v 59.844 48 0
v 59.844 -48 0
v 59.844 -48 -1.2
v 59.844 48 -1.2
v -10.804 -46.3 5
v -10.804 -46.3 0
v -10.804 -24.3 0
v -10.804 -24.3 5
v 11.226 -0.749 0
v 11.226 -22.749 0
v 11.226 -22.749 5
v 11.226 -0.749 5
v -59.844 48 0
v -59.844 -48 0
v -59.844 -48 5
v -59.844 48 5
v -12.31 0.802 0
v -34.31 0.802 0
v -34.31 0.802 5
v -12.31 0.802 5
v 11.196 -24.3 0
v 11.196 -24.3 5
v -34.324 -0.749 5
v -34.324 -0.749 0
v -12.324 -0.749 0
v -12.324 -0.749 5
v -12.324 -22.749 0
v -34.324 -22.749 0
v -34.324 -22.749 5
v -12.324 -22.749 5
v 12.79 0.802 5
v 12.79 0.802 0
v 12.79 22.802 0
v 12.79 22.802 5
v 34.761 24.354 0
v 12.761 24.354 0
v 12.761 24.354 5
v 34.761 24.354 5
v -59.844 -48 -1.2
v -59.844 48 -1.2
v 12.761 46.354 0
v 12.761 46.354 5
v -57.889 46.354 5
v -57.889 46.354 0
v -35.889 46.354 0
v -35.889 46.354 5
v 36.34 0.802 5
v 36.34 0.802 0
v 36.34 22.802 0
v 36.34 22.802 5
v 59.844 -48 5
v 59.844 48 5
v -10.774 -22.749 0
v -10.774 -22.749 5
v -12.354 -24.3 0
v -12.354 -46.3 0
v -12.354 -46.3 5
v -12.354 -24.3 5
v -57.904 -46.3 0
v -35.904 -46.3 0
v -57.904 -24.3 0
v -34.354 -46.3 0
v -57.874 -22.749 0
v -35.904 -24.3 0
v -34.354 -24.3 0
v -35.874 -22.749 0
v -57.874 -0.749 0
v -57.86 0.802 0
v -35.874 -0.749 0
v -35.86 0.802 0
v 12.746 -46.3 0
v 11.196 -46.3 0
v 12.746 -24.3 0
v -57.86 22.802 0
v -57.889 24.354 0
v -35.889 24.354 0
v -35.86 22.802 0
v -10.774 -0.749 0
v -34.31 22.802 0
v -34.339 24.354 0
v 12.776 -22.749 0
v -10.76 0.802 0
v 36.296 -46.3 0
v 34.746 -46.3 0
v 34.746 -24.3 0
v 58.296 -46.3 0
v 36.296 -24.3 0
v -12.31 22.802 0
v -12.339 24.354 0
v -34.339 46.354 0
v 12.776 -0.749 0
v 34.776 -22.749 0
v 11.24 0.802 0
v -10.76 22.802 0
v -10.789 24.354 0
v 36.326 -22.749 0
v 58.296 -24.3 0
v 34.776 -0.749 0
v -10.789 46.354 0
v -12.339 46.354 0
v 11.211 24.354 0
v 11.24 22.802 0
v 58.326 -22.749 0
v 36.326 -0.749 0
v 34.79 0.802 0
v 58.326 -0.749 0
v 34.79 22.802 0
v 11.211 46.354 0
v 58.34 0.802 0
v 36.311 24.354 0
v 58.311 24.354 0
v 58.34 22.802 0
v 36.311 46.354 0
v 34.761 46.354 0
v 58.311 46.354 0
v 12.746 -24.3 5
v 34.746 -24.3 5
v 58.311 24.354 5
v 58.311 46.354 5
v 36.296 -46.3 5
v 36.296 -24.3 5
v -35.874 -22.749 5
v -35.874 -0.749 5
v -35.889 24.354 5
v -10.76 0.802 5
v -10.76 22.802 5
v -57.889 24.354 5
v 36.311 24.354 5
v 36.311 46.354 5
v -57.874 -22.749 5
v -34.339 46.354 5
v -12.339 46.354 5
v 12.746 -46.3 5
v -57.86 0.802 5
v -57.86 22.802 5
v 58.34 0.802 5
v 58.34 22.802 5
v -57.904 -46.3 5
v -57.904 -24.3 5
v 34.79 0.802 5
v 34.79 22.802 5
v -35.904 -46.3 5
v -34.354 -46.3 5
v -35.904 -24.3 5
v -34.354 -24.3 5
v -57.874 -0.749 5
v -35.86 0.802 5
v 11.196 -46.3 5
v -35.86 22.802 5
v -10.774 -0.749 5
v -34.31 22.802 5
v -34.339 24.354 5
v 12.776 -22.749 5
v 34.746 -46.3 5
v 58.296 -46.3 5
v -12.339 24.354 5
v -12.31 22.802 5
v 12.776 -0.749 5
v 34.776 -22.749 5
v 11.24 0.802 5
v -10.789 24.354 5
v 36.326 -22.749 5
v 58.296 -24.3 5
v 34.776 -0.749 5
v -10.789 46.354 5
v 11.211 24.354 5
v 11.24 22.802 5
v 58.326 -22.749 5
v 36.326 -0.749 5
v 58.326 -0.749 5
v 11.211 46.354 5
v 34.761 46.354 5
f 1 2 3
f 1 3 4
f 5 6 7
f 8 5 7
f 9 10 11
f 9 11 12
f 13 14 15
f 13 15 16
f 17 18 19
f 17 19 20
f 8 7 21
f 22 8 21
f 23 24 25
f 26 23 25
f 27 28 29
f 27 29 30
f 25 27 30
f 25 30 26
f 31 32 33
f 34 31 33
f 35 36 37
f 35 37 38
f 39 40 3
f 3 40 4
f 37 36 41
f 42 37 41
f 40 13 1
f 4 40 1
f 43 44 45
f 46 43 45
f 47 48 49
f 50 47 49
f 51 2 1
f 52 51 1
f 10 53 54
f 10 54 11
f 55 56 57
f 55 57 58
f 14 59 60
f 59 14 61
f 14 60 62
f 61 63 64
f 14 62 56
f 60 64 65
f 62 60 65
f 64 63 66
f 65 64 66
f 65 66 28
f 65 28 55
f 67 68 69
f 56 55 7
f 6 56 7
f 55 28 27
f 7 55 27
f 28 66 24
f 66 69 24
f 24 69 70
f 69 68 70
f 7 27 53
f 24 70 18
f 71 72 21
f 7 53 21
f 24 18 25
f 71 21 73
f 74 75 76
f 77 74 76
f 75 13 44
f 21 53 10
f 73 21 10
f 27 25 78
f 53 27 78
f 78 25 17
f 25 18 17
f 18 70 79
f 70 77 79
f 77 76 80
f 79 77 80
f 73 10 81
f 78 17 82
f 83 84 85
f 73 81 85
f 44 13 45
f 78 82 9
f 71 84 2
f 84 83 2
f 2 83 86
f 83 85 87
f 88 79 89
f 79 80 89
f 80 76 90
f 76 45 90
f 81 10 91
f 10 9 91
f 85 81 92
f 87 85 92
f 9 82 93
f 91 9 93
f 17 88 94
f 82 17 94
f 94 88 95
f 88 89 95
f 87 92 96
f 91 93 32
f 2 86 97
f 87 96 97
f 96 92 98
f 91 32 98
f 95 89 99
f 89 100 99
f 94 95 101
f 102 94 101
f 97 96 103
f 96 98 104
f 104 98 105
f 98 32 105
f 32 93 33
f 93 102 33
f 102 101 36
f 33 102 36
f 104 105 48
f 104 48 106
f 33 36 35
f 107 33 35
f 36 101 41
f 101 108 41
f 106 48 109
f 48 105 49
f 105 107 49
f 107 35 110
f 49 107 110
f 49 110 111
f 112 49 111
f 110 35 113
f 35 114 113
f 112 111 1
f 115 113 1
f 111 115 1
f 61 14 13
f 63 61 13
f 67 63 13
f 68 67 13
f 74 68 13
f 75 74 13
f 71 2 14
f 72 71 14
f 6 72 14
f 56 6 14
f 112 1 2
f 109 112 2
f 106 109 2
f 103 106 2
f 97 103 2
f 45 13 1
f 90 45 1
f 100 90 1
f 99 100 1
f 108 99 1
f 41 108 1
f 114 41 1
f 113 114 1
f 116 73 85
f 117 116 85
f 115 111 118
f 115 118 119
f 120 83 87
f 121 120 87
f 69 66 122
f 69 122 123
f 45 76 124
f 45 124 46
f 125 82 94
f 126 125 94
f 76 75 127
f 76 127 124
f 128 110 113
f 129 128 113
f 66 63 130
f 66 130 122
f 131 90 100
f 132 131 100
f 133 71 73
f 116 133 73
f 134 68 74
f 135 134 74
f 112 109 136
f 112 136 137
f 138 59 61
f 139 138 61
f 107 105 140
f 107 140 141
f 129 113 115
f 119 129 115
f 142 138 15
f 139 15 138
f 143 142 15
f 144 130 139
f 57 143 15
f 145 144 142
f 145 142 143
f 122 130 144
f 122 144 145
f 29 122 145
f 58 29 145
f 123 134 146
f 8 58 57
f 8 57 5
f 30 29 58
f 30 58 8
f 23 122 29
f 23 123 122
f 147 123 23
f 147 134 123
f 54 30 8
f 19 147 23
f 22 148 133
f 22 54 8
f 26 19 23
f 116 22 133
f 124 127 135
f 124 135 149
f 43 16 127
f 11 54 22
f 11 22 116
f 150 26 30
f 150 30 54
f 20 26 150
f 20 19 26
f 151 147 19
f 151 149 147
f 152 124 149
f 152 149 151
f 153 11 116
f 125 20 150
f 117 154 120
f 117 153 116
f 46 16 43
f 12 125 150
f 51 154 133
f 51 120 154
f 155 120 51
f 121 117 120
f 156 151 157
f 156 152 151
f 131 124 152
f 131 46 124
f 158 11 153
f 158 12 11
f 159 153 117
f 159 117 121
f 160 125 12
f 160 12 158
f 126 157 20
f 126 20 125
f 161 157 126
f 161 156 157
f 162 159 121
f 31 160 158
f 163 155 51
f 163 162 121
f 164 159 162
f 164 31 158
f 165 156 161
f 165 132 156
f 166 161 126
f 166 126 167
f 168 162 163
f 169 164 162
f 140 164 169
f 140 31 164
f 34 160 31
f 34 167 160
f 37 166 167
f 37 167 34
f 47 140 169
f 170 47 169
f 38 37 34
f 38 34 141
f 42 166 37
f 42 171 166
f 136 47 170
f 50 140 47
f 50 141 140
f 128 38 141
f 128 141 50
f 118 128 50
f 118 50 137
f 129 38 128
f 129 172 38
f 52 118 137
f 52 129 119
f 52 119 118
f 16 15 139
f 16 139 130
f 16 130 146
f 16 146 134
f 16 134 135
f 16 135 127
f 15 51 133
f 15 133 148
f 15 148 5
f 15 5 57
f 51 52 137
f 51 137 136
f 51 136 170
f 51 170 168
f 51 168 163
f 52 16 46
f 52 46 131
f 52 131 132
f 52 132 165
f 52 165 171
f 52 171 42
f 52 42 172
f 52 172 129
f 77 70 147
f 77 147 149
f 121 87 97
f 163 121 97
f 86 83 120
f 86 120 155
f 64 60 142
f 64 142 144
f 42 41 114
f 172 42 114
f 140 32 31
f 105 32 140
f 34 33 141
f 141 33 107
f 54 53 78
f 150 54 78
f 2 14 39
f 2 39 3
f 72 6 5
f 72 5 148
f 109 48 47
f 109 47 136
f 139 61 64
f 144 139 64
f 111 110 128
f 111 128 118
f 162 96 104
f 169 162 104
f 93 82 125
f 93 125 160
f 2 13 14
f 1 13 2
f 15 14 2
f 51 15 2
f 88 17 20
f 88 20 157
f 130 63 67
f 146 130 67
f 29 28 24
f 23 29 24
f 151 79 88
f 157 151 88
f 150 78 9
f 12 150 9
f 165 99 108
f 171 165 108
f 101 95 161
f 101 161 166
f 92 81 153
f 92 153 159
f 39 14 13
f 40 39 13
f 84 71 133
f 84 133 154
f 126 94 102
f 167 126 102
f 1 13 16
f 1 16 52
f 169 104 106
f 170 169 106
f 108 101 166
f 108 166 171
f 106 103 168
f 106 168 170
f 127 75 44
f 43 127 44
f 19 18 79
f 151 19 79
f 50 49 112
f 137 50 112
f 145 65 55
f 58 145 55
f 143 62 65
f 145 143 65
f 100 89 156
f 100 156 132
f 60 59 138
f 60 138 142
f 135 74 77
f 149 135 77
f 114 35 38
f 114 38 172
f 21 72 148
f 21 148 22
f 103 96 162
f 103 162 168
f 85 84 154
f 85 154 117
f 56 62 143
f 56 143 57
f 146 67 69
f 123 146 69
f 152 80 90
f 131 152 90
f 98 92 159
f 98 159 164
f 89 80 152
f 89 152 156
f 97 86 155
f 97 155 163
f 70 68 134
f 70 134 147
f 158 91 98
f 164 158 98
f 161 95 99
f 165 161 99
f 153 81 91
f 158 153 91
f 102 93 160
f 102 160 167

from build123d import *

# Parameters (mm, degrees)
F0_W     = 119.688
F0_H     = 96
F0_W_2   = 22
F0_H_2   = 22
F0_W_3   = 21.999999
F1_DEPTH = 1.2
F2_DEPTH = 5


with BuildPart() as f1:
    # F0 (on Top) → F1 (new body)
    with BuildSketch(Plane.XY):
        Rectangle(F0_W, F0_H)
        with Locations((-46.903828, -35.3)):
            Rectangle(F0_W_2, F0_H_2, mode=Mode.SUBTRACT)
        with Locations((-23.353828, -35.3)):
            Rectangle(F0_W_2, F0_H_2, mode=Mode.SUBTRACT)
        with Locations((-46.8744295, -11.748823)):
            Rectangle(F0_W_3, F0_H_2, mode=Mode.SUBTRACT)
        with Locations((-23.32443, -11.748823)):
            Rectangle(F0_W_2, F0_H_2, mode=Mode.SUBTRACT)
        with Locations((0.196172, -35.3)):
            Rectangle(F0_W_2, F0_H_2, mode=Mode.SUBTRACT)
        with Locations((23.746172, -35.3)):
            Rectangle(F0_W_2, F0_H_2, mode=Mode.SUBTRACT)
        with Locations((47.296172, -35.3)):
            Rectangle(F0_W_2, F0_H_2, mode=Mode.SUBTRACT)
        with Locations((0.22557, -11.748823)):
            Rectangle(F0_W_2, F0_H_2, mode=Mode.SUBTRACT)
        with Locations((23.77557, -11.748823)):
            Rectangle(F0_W_2, F0_H_2, mode=Mode.SUBTRACT)
        with Locations((47.32557, -11.748823)):
            Rectangle(F0_W_2, F0_H_2, mode=Mode.SUBTRACT)
        with Locations((-46.859731, 11.802354)):
            Rectangle(F0_W_2, F0_H_2, mode=Mode.SUBTRACT)
        with Locations((-23.309731, 11.802354)):
            Rectangle(F0_W_2, F0_H_2, mode=Mode.SUBTRACT)
        with Locations((-46.889129, 35.35353)):
            Rectangle(F0_W_2, F0_H_2, mode=Mode.SUBTRACT)
        with Locations((-23.339129, 35.35353)):
            Rectangle(F0_W_2, F0_H_2, mode=Mode.SUBTRACT)
        with Locations((0.240269, 11.802354)):
            Rectangle(F0_W_2, F0_H_2, mode=Mode.SUBTRACT)
        with Locations((23.790269, 11.802354)):
            Rectangle(F0_W_2, F0_H_2, mode=Mode.SUBTRACT)
        with Locations((47.340269, 11.802354)):
            Rectangle(F0_W_2, F0_H_2, mode=Mode.SUBTRACT)
        with Locations((0.210871, 35.35353)):
            Rectangle(F0_W_2, F0_H_2, mode=Mode.SUBTRACT)
        with Locations((23.760871, 35.35353)):
            Rectangle(F0_W_2, F0_H_2, mode=Mode.SUBTRACT)
        with Locations((47.310871, 35.35353)):
            Rectangle(F0_W_2, F0_H_2, mode=Mode.SUBTRACT)
        with Locations((47.310871, 35.35353)):
            Rectangle(F0_W_2, F0_H_2)
        with Locations((47.340269, 11.802354)):
            Rectangle(F0_W_2, F0_H_2)
        with Locations((23.746172, -35.3)):
            Rectangle(F0_W_2, F0_H_2)
        with Locations((23.790269, 11.802354)):
            Rectangle(F0_W_2, F0_H_2)
        with Locations((23.77557, -11.748823)):
            Rectangle(F0_W_2, F0_H_2)
        with Locations((-46.903828, -35.3)):
            Rectangle(F0_W_2, F0_H_2)
        with Locations((-23.339129, 35.35353)):
            Rectangle(F0_W_2, F0_H_2)
        with Locations((-23.309731, 11.802354)):
            Rectangle(F0_W_2, F0_H_2)
        with Locations((-23.32443, -11.748823)):
            Rectangle(F0_W_2, F0_H_2)
        with Locations((-23.353828, -35.3)):
            Rectangle(F0_W_2, F0_H_2)
        with Locations((0.210871, 35.35353)):
            Rectangle(F0_W_2, F0_H_2)
        with Locations((0.240269, 11.802354)):
            Rectangle(F0_W_2, F0_H_2)
        with Locations((0.22557, -11.748823)):
            Rectangle(F0_W_2, F0_H_2)
        with Locations((0.196172, -35.3)):
            Rectangle(F0_W_2, F0_H_2)
        with Locations((23.760871, 35.35353)):
            Rectangle(F0_W_2, F0_H_2)
        with Locations((47.32557, -11.748823)):
            Rectangle(F0_W_2, F0_H_2)
        with Locations((47.296172, -35.3)):
            Rectangle(F0_W_2, F0_H_2)
        with Locations((-46.889129, 35.35353)):
            Rectangle(F0_W_2, F0_H_2)
        with Locations((-46.859731, 11.802354)):
            Rectangle(F0_W_2, F0_H_2)
        with Locations((-46.8744295, -11.748823)):
            Rectangle(F0_W_3, F0_H_2)
    extrude(amount=-F1_DEPTH)


with BuildPart() as f2:
    # F0 (on Top) → F2 (new body)
    with BuildSketch(Plane.XY):
        Rectangle(F0_W, F0_H)
        with Locations((-46.903828, -35.3)):
            Rectangle(F0_W_2, F0_H_2, mode=Mode.SUBTRACT)
        with Locations((-23.353828, -35.3)):
            Rectangle(F0_W_2, F0_H_2, mode=Mode.SUBTRACT)
        with Locations((-46.8744295, -11.748823)):
            Rectangle(F0_W_3, F0_H_2, mode=Mode.SUBTRACT)
        with Locations((-23.32443, -11.748823)):
            Rectangle(F0_W_2, F0_H_2, mode=Mode.SUBTRACT)
        with Locations((0.196172, -35.3)):
            Rectangle(F0_W_2, F0_H_2, mode=Mode.SUBTRACT)
        with Locations((23.746172, -35.3)):
            Rectangle(F0_W_2, F0_H_2, mode=Mode.SUBTRACT)
        with Locations((47.296172, -35.3)):
            Rectangle(F0_W_2, F0_H_2, mode=Mode.SUBTRACT)
        with Locations((0.22557, -11.748823)):
            Rectangle(F0_W_2, F0_H_2, mode=Mode.SUBTRACT)
        with Locations((23.77557, -11.748823)):
            Rectangle(F0_W_2, F0_H_2, mode=Mode.SUBTRACT)
        with Locations((47.32557, -11.748823)):
            Rectangle(F0_W_2, F0_H_2, mode=Mode.SUBTRACT)
        with Locations((-46.859731, 11.802354)):
            Rectangle(F0_W_2, F0_H_2, mode=Mode.SUBTRACT)
        with Locations((-23.309731, 11.802354)):
            Rectangle(F0_W_2, F0_H_2, mode=Mode.SUBTRACT)
        with Locations((-46.889129, 35.35353)):
            Rectangle(F0_W_2, F0_H_2, mode=Mode.SUBTRACT)
        with Locations((-23.339129, 35.35353)):
            Rectangle(F0_W_2, F0_H_2, mode=Mode.SUBTRACT)
        with Locations((0.240269, 11.802354)):
            Rectangle(F0_W_2, F0_H_2, mode=Mode.SUBTRACT)
        with Locations((23.790269, 11.802354)):
            Rectangle(F0_W_2, F0_H_2, mode=Mode.SUBTRACT)
        with Locations((47.340269, 11.802354)):
            Rectangle(F0_W_2, F0_H_2, mode=Mode.SUBTRACT)
        with Locations((0.210871, 35.35353)):
            Rectangle(F0_W_2, F0_H_2, mode=Mode.SUBTRACT)
        with Locations((23.760871, 35.35353)):
            Rectangle(F0_W_2, F0_H_2, mode=Mode.SUBTRACT)
        with Locations((47.310871, 35.35353)):
            Rectangle(F0_W_2, F0_H_2, mode=Mode.SUBTRACT)
    extrude(amount=F2_DEPTH)


solid = Compound([f1.part, f2.part])
